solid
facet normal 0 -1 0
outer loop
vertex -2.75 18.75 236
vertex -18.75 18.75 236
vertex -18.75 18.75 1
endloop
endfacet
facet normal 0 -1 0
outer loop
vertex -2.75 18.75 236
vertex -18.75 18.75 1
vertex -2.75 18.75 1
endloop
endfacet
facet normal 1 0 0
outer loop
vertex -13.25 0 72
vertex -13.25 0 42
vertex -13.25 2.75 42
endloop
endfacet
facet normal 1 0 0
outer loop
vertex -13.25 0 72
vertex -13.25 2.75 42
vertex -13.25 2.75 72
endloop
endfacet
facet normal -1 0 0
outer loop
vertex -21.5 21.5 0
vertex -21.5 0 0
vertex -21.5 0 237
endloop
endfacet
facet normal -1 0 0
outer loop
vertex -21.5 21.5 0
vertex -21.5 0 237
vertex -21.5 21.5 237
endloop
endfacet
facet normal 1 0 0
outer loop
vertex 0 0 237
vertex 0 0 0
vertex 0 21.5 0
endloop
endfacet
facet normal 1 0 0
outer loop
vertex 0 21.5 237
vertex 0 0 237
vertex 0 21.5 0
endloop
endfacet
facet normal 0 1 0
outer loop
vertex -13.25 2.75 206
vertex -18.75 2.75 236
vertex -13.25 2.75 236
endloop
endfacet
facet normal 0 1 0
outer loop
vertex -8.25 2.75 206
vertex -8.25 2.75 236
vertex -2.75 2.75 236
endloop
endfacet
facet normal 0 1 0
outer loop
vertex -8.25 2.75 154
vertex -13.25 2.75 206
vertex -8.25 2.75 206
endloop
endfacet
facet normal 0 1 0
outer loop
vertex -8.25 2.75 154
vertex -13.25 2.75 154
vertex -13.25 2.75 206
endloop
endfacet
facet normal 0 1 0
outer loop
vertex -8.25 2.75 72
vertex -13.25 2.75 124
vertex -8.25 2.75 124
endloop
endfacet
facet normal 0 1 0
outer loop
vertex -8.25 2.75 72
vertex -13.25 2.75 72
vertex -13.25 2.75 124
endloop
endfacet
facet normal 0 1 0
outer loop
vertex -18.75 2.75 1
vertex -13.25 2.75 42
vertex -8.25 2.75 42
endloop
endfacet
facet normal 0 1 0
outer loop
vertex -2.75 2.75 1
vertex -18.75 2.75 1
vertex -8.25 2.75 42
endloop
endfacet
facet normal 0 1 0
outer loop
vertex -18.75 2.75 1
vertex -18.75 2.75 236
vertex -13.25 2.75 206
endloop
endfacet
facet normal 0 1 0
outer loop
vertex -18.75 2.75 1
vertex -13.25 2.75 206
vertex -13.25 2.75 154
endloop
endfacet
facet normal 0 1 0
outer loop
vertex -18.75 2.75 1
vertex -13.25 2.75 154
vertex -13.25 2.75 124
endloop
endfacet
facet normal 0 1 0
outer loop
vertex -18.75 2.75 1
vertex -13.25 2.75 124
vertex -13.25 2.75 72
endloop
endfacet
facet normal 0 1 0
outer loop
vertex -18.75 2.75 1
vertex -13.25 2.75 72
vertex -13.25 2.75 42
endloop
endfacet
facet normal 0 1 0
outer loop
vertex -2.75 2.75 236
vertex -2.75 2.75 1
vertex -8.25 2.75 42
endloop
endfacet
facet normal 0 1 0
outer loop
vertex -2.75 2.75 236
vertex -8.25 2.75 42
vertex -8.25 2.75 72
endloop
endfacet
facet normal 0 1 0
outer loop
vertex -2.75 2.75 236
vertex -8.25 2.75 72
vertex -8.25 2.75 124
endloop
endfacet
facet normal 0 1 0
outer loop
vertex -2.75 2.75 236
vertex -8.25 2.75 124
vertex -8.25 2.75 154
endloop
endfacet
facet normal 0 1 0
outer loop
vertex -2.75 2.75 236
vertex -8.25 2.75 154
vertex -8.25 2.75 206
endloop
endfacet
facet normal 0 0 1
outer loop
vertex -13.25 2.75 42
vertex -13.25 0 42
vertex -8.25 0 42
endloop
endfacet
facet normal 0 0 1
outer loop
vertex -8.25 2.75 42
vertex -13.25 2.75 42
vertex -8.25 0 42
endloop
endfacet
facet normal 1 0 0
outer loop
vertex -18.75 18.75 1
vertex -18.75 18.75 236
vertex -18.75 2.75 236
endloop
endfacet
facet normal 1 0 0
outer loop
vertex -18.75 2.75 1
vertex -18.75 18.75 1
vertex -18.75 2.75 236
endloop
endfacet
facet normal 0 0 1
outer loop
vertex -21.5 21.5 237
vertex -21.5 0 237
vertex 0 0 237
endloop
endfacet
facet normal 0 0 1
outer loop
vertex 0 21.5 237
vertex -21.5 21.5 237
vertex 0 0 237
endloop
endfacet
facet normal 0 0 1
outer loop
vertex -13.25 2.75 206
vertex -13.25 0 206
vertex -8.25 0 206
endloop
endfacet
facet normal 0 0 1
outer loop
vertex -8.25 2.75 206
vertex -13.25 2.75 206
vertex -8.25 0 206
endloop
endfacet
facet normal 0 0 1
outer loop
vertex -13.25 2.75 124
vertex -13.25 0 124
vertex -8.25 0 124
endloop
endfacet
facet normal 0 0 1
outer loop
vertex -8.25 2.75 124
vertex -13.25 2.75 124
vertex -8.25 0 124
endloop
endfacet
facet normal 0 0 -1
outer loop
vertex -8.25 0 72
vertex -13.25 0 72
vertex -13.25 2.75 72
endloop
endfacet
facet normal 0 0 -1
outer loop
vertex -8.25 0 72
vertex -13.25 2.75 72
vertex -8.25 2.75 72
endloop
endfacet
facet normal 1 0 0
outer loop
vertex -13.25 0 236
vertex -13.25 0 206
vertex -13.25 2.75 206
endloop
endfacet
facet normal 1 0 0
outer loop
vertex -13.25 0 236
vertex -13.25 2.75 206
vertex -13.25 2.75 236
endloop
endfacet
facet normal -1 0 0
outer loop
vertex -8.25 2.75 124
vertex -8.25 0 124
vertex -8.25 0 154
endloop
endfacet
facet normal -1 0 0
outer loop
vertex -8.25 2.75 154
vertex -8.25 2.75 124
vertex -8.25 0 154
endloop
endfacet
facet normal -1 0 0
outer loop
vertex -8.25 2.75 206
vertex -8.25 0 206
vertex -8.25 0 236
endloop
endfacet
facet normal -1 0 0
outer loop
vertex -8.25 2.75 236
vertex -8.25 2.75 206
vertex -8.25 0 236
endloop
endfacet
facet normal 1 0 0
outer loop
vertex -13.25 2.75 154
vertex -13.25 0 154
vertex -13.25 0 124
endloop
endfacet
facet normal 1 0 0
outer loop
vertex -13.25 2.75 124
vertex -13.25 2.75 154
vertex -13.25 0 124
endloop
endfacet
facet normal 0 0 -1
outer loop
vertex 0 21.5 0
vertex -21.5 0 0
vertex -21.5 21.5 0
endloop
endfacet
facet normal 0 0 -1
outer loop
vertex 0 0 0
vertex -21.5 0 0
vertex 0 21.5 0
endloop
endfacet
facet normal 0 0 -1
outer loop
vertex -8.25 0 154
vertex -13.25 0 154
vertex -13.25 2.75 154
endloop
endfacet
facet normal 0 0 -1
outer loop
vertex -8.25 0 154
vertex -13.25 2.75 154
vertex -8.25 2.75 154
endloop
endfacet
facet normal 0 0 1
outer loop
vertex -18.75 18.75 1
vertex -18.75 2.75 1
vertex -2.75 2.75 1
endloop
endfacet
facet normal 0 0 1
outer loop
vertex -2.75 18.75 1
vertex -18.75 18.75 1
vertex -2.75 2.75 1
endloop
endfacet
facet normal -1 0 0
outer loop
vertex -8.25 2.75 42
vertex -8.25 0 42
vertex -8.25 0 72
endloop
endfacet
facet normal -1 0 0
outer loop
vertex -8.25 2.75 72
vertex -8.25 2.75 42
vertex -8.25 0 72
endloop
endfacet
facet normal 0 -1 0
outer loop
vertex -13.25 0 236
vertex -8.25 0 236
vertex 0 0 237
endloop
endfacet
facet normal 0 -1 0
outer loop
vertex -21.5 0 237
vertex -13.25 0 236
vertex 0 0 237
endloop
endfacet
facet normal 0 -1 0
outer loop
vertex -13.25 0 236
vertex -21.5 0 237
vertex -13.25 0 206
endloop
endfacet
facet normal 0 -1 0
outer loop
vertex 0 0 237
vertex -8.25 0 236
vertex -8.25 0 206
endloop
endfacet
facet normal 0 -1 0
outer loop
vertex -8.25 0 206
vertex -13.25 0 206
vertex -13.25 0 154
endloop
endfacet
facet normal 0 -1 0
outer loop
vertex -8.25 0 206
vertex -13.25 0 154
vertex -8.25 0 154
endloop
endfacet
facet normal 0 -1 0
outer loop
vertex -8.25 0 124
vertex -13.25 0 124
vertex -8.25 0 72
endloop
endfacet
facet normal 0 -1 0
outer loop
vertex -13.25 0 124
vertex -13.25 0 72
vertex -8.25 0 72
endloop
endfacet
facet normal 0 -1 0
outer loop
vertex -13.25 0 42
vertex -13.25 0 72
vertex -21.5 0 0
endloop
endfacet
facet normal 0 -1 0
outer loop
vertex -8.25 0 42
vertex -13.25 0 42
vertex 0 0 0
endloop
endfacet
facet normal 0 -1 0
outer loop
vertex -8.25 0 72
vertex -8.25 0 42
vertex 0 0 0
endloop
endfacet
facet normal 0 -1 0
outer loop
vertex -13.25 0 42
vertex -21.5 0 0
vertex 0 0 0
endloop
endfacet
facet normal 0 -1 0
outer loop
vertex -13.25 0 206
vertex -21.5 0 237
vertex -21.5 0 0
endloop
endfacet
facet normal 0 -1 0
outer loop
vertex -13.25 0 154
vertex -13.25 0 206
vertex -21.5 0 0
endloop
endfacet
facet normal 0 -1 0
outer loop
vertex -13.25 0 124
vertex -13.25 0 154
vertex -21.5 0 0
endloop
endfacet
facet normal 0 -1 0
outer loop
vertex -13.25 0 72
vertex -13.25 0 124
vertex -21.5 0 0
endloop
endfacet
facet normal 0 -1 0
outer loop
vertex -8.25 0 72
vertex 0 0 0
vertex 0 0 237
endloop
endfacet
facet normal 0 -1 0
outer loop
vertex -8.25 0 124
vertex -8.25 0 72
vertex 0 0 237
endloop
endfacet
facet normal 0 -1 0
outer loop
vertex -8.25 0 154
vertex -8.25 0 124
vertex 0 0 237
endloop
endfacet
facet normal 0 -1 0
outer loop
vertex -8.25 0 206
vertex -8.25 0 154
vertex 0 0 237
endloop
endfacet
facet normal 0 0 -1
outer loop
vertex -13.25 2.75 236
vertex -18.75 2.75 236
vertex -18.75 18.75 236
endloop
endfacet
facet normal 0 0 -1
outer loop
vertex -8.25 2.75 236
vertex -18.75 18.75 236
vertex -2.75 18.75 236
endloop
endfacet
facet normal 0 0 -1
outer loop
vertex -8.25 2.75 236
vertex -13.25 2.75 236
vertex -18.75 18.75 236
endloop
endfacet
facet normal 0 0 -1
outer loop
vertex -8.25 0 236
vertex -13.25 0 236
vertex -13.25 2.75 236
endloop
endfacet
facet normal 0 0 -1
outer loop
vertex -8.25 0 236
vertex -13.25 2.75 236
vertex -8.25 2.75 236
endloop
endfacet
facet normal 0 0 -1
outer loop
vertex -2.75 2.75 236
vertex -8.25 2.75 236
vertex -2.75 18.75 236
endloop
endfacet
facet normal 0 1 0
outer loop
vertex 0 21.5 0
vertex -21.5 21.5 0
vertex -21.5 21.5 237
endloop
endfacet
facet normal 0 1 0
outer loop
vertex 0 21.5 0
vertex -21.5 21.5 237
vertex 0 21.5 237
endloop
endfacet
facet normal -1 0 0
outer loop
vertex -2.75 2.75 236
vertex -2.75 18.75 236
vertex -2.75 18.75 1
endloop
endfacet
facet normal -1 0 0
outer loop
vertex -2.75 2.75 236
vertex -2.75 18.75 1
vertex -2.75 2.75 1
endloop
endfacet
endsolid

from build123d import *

# Parameters (mm, degrees)
F0_W     = 21.5
F0_H     = 21.5
F0_W_2   = 16
F0_H_2   = 16
F1_DEPTH = 237
F2_W     = 5
F2_H     = 30
F2_H_2   = 15
F3_DEPTH = 2.75
F4_W     = 16
F4_H     = 16
F5_DEPTH = 236
F6_W     = 16
F6_H     = 16
F7_DEPTH = 1


with BuildPart() as f1:
    # F0 (on Top) → F1 (new body)
    with BuildSketch(Plane.XY):
        with Locations((-10.75, 10.75)):
            Rectangle(F0_W, F0_H)
        with Locations((-10.75, 10.75)):
            Rectangle(F0_W_2, F0_H_2, mode=Mode.SUBTRACT)
        with Locations((-10.75, 10.75)):
            Rectangle(F0_W_2, F0_H_2)
    extrude(amount=F1_DEPTH)

    # F2 (on face) → F3 (cut)
    with BuildSketch(Plane.XZ):
        with Locations((-10.75, 221)):
            Rectangle(F2_W, F2_H)
        with Locations((-10.75, 146.5)):
            Rectangle(F2_W, F2_H_2)
        with Locations((-10.75, 131.5)):
            Rectangle(F2_W, F2_H_2)
        with Locations((-10.75, 57)):
            Rectangle(F2_W, F2_H)
    extrude(amount=-F3_DEPTH, mode=Mode.SUBTRACT)

    # F4 (on face) → F5 (cut)
    with BuildSketch(Plane(origin=(0, 0, 0), x_dir=(1, 0, 0), z_dir=(0, 0, -1))):
        with Locations((-10.75, -10.75)):
            Rectangle(F4_W, F4_H)
    extrude(amount=-F5_DEPTH, mode=Mode.SUBTRACT)

    # F6 (on face) → F7 (join)
    with BuildSketch(Plane(origin=(0, 0, 0), x_dir=(1, 0, 0), z_dir=(0, 0, -1))):
        with Locations((-10.75, -10.75)):
            Rectangle(F6_W, F6_H)
    extrude(amount=-F7_DEPTH)


solid = f1.part
